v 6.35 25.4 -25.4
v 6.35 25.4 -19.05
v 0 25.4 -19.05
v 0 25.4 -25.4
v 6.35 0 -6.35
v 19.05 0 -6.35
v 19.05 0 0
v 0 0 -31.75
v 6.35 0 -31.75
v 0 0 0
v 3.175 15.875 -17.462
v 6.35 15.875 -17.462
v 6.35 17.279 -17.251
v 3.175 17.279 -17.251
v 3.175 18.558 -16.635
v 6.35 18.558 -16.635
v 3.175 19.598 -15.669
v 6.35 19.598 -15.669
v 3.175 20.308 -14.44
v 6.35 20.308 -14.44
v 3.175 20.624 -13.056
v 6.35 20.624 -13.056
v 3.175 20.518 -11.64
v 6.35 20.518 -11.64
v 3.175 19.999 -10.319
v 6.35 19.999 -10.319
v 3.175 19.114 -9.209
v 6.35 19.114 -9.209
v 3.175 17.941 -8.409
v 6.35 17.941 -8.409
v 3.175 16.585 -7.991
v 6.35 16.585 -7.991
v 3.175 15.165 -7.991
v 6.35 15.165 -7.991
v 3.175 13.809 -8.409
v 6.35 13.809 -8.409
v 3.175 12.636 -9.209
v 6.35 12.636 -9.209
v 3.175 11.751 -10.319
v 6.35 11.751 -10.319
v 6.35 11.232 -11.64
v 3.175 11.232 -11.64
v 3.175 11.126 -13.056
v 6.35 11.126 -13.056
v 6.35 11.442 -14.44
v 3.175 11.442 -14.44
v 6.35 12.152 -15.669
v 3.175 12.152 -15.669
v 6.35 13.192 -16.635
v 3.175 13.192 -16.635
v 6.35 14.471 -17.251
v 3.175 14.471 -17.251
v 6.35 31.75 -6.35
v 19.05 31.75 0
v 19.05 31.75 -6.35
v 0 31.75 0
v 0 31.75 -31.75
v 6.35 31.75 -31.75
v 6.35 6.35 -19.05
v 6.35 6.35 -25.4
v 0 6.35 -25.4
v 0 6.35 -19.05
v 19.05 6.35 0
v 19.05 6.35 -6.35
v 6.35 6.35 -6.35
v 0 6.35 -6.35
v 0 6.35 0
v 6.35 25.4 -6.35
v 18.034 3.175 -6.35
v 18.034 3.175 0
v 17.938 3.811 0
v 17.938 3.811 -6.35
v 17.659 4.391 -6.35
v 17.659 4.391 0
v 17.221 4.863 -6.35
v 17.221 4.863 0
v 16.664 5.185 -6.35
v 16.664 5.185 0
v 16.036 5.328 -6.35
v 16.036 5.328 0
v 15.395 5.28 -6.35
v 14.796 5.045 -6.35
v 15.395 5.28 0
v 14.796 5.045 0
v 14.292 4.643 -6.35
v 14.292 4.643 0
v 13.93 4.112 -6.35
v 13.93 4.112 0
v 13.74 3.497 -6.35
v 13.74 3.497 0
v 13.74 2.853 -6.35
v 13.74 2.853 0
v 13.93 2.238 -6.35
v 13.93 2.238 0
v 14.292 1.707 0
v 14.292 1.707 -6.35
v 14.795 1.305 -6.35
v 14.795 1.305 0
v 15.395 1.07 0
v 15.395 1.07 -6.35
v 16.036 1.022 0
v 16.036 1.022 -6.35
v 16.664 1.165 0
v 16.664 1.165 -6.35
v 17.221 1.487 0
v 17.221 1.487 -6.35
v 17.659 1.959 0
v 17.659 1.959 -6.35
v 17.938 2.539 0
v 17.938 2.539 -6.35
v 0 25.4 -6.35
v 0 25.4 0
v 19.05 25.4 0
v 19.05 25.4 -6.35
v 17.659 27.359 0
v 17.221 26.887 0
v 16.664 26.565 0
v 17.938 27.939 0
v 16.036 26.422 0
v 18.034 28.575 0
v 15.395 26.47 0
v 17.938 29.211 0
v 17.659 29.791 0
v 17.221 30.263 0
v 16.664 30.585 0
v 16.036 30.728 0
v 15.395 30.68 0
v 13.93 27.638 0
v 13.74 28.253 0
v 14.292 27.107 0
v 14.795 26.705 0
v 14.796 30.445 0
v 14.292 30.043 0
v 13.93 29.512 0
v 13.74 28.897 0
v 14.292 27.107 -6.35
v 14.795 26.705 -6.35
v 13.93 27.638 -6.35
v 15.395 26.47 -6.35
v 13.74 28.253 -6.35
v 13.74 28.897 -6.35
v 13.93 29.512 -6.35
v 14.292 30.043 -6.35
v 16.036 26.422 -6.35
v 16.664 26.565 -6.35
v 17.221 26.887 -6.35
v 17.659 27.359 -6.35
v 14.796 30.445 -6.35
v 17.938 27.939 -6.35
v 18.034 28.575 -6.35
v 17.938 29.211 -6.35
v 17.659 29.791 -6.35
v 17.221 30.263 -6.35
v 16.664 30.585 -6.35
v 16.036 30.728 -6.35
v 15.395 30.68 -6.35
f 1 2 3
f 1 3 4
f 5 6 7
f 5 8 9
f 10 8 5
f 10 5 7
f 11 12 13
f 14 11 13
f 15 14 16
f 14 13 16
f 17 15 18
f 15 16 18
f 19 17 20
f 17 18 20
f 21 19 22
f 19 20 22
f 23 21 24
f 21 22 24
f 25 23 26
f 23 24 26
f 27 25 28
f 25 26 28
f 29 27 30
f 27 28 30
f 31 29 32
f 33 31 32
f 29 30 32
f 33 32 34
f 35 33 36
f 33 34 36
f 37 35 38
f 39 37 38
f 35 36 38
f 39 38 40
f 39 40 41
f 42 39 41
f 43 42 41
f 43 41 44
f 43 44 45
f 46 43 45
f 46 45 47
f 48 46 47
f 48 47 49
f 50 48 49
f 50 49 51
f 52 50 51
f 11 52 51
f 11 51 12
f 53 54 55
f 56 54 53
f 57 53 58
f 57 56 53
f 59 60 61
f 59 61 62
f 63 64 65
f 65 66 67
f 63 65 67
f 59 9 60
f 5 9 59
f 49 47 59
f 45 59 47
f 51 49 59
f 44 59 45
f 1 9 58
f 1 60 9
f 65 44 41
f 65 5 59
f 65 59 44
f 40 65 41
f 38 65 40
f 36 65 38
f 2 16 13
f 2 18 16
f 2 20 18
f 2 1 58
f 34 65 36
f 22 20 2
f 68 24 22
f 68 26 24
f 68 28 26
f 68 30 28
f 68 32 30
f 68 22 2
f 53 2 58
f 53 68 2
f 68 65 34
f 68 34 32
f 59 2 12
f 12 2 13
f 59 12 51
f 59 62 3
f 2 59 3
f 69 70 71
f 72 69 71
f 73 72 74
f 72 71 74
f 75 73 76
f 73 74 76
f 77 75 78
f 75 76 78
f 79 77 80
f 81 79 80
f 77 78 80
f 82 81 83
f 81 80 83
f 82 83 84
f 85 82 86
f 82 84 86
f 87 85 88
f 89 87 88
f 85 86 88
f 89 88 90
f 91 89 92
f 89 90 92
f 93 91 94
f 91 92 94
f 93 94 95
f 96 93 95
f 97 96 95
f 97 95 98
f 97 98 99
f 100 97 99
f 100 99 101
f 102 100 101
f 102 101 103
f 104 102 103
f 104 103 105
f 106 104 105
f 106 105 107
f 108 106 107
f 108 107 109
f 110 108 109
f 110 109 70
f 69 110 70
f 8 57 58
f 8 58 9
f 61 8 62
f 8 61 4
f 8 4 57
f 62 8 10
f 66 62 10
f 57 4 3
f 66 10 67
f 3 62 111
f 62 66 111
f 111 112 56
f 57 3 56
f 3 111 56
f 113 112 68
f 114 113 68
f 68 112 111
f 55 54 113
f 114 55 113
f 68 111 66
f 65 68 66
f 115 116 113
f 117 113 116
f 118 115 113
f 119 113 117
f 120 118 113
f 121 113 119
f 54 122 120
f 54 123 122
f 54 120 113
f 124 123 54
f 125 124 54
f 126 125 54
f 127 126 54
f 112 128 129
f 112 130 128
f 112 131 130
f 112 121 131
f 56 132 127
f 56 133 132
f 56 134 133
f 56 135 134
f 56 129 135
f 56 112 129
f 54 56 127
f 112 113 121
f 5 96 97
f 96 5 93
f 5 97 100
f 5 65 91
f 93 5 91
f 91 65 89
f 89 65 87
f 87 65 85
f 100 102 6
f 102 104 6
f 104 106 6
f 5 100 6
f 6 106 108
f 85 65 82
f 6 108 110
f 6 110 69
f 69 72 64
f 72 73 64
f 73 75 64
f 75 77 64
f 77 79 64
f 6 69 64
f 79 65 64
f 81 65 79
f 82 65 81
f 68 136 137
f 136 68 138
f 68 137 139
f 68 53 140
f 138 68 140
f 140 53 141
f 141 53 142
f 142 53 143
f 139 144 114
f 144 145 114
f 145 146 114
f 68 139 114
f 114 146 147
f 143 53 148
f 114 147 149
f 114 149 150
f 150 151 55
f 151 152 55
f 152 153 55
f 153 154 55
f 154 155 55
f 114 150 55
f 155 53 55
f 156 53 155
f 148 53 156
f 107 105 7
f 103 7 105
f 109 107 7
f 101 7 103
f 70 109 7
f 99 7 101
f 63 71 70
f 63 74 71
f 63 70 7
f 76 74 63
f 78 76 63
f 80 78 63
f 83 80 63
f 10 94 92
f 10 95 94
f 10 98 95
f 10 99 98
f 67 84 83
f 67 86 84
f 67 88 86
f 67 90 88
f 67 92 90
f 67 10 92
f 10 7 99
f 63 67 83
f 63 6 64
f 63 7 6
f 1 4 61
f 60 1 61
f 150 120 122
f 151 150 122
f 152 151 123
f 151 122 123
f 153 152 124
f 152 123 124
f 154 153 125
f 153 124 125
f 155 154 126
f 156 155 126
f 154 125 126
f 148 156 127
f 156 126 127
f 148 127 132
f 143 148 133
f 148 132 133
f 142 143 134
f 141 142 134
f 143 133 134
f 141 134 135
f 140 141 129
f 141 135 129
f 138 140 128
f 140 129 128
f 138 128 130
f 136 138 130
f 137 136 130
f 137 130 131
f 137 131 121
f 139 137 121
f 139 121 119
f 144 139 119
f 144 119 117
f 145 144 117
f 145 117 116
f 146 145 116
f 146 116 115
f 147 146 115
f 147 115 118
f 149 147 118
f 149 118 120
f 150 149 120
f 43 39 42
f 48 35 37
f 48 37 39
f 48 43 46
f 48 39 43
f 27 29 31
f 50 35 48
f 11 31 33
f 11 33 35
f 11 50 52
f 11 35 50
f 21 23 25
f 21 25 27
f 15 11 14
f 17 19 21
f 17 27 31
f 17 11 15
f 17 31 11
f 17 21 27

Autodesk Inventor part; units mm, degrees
ref_plane "YZ Plane" through (0, 0, 0) normal (1, 0, 0) x (0, 1, 0)
ref_plane "XZ Plane" through (0, 0, 0) normal (0, 1, 0) x (-1, 0, 0)
ref_plane "XY Plane" through (0, 0, 0) normal (0, 0, 1) x (1, 0, 0)
sketch "Sketch1" plane through (0, 0, 0) normal (1, 0, 0) x (0, 1, 0)
  line L0 (31.75, 0) -> (31.75, -31.75)
  line L1 (31.75, -31.75) -> (0, -31.75)
  line L2 (0, -31.75) -> (0, 0)
  line L3 (25.4, 0) -> (25.4, -6.35)
  line L4 (25.4, -6.35) -> (6.35, -6.35)
  line L5 (6.35, -6.35) -> (6.35, 0)
  line L6 (6.35, -31.75) -> (25.4, -31.75)
  line L7 (0, 0) -> (6.35, 0)
  line L8 (25.4, 0) -> (31.75, 0)
  line L9 (6.35, -19.05) -> (25.4, -19.05)
  line L10 (25.4, -19.05) -> (25.4, -25.4)
  line L11 (25.4, -25.4) -> (6.35, -25.4)
  line L12 (6.35, -25.4) -> (6.35, -19.05)
  dimension "d6" = 6.35
  dimension "d8" = 19.05
  dimension "d9" = 6.35
  dimension "d10" = 6.35
  dimension "d11" = 6.35
  dimension "d19" = 31.75
  dimension "d20" = 31.75
extrude "Extrusion1" add sketch "Sketch1" along normal blind 6.35
sketch "Sketch2" plane through (6.35, 0, 0) normal (1, 0, 0) x (0, 0, -1)
  line L0 (19.05, 25.4) -> (25.4, 25.4) projected
  line L1 (25.4, 25.4) -> (25.4, 6.35) projected
  line L2 (25.4, 6.35) -> (19.05, 6.35) projected
  line L3 (19.05, 6.35) -> (19.05, 25.4) projected
  line L4 (0, 0) -> (31.75, 0) projected
  line L5 (31.75, 0) -> (31.75, 31.75) projected
  line L6 (31.75, 31.75) -> (0, 31.75) projected
  line L7 (0, 31.75) -> (0, 25.4) projected
  line L8 (0, 25.4) -> (6.35, 25.4) projected
  line L9 (6.35, 25.4) -> (6.35, 6.35) projected
  line L10 (6.35, 6.35) -> (0, 6.35) projected
  line L11 (0, 6.35) -> (0, 0) projected
  circle A0 centre (12.7, 15.875) radius 4.7625
  dimension "d14" = 9.525
  dimension "d15" = 15.875
  dimension "d16" = 6.35
extrude "Extrusion2" cut sketch "Sketch2" against normal blind 3.175 contours A0
sketch "Sketch3" plane through (0, 25.4, 0) normal (0, 0, 1) x (1, 0, 0)
  line L0 (0, 6.35) -> (0, 0) projected
  line L1 (0, 0) -> (6.35, 0) projected
  line L2 (6.35, 6.35) -> (6.35, 0) projected
  line L3 (0, 6.35) -> (6.35, 6.35) projected
  line L4 (0, -19.05) -> (0, -25.4) projected
  line L5 (0, -25.4) -> (6.35, -25.4) projected
  line L6 (6.35, -19.05) -> (6.35, -25.4) projected
  line L7 (0, -19.05) -> (6.35, -19.05) projected
  line L8 (0, 6.35) -> (19.05, 6.35)
  line L9 (19.05, 6.35) -> (19.05, 0)
  line L10 (19.05, 0) -> (0, 0)
  line L11 (0, 0) -> (0, 6.35)
  line L12 (0, -25.4) -> (19.05, -25.4)
  line L13 (19.05, -25.4) -> (19.05, -19.05)
  line L14 (19.05, -19.05) -> (0, -19.05)
  line L15 (0, -19.05) -> (0, -25.4)
  circle A0 centre (15.875, 3.175) radius 2.159
  circle A1 centre (15.875, -22.225) radius 2.159
  dimension "d21" = 19.05
  dimension "d22" = 4.318
  dimension "d23" = 3.175
  dimension "d24" = 4.318
extrude "Extrusion3" add sketch "Sketch3" against normal blind 6.35 contours L8 L9 L10 L2 | L14 L13 L12 L6
equation "\"d20\" = d19"
properties part number "TensionerPlate"
